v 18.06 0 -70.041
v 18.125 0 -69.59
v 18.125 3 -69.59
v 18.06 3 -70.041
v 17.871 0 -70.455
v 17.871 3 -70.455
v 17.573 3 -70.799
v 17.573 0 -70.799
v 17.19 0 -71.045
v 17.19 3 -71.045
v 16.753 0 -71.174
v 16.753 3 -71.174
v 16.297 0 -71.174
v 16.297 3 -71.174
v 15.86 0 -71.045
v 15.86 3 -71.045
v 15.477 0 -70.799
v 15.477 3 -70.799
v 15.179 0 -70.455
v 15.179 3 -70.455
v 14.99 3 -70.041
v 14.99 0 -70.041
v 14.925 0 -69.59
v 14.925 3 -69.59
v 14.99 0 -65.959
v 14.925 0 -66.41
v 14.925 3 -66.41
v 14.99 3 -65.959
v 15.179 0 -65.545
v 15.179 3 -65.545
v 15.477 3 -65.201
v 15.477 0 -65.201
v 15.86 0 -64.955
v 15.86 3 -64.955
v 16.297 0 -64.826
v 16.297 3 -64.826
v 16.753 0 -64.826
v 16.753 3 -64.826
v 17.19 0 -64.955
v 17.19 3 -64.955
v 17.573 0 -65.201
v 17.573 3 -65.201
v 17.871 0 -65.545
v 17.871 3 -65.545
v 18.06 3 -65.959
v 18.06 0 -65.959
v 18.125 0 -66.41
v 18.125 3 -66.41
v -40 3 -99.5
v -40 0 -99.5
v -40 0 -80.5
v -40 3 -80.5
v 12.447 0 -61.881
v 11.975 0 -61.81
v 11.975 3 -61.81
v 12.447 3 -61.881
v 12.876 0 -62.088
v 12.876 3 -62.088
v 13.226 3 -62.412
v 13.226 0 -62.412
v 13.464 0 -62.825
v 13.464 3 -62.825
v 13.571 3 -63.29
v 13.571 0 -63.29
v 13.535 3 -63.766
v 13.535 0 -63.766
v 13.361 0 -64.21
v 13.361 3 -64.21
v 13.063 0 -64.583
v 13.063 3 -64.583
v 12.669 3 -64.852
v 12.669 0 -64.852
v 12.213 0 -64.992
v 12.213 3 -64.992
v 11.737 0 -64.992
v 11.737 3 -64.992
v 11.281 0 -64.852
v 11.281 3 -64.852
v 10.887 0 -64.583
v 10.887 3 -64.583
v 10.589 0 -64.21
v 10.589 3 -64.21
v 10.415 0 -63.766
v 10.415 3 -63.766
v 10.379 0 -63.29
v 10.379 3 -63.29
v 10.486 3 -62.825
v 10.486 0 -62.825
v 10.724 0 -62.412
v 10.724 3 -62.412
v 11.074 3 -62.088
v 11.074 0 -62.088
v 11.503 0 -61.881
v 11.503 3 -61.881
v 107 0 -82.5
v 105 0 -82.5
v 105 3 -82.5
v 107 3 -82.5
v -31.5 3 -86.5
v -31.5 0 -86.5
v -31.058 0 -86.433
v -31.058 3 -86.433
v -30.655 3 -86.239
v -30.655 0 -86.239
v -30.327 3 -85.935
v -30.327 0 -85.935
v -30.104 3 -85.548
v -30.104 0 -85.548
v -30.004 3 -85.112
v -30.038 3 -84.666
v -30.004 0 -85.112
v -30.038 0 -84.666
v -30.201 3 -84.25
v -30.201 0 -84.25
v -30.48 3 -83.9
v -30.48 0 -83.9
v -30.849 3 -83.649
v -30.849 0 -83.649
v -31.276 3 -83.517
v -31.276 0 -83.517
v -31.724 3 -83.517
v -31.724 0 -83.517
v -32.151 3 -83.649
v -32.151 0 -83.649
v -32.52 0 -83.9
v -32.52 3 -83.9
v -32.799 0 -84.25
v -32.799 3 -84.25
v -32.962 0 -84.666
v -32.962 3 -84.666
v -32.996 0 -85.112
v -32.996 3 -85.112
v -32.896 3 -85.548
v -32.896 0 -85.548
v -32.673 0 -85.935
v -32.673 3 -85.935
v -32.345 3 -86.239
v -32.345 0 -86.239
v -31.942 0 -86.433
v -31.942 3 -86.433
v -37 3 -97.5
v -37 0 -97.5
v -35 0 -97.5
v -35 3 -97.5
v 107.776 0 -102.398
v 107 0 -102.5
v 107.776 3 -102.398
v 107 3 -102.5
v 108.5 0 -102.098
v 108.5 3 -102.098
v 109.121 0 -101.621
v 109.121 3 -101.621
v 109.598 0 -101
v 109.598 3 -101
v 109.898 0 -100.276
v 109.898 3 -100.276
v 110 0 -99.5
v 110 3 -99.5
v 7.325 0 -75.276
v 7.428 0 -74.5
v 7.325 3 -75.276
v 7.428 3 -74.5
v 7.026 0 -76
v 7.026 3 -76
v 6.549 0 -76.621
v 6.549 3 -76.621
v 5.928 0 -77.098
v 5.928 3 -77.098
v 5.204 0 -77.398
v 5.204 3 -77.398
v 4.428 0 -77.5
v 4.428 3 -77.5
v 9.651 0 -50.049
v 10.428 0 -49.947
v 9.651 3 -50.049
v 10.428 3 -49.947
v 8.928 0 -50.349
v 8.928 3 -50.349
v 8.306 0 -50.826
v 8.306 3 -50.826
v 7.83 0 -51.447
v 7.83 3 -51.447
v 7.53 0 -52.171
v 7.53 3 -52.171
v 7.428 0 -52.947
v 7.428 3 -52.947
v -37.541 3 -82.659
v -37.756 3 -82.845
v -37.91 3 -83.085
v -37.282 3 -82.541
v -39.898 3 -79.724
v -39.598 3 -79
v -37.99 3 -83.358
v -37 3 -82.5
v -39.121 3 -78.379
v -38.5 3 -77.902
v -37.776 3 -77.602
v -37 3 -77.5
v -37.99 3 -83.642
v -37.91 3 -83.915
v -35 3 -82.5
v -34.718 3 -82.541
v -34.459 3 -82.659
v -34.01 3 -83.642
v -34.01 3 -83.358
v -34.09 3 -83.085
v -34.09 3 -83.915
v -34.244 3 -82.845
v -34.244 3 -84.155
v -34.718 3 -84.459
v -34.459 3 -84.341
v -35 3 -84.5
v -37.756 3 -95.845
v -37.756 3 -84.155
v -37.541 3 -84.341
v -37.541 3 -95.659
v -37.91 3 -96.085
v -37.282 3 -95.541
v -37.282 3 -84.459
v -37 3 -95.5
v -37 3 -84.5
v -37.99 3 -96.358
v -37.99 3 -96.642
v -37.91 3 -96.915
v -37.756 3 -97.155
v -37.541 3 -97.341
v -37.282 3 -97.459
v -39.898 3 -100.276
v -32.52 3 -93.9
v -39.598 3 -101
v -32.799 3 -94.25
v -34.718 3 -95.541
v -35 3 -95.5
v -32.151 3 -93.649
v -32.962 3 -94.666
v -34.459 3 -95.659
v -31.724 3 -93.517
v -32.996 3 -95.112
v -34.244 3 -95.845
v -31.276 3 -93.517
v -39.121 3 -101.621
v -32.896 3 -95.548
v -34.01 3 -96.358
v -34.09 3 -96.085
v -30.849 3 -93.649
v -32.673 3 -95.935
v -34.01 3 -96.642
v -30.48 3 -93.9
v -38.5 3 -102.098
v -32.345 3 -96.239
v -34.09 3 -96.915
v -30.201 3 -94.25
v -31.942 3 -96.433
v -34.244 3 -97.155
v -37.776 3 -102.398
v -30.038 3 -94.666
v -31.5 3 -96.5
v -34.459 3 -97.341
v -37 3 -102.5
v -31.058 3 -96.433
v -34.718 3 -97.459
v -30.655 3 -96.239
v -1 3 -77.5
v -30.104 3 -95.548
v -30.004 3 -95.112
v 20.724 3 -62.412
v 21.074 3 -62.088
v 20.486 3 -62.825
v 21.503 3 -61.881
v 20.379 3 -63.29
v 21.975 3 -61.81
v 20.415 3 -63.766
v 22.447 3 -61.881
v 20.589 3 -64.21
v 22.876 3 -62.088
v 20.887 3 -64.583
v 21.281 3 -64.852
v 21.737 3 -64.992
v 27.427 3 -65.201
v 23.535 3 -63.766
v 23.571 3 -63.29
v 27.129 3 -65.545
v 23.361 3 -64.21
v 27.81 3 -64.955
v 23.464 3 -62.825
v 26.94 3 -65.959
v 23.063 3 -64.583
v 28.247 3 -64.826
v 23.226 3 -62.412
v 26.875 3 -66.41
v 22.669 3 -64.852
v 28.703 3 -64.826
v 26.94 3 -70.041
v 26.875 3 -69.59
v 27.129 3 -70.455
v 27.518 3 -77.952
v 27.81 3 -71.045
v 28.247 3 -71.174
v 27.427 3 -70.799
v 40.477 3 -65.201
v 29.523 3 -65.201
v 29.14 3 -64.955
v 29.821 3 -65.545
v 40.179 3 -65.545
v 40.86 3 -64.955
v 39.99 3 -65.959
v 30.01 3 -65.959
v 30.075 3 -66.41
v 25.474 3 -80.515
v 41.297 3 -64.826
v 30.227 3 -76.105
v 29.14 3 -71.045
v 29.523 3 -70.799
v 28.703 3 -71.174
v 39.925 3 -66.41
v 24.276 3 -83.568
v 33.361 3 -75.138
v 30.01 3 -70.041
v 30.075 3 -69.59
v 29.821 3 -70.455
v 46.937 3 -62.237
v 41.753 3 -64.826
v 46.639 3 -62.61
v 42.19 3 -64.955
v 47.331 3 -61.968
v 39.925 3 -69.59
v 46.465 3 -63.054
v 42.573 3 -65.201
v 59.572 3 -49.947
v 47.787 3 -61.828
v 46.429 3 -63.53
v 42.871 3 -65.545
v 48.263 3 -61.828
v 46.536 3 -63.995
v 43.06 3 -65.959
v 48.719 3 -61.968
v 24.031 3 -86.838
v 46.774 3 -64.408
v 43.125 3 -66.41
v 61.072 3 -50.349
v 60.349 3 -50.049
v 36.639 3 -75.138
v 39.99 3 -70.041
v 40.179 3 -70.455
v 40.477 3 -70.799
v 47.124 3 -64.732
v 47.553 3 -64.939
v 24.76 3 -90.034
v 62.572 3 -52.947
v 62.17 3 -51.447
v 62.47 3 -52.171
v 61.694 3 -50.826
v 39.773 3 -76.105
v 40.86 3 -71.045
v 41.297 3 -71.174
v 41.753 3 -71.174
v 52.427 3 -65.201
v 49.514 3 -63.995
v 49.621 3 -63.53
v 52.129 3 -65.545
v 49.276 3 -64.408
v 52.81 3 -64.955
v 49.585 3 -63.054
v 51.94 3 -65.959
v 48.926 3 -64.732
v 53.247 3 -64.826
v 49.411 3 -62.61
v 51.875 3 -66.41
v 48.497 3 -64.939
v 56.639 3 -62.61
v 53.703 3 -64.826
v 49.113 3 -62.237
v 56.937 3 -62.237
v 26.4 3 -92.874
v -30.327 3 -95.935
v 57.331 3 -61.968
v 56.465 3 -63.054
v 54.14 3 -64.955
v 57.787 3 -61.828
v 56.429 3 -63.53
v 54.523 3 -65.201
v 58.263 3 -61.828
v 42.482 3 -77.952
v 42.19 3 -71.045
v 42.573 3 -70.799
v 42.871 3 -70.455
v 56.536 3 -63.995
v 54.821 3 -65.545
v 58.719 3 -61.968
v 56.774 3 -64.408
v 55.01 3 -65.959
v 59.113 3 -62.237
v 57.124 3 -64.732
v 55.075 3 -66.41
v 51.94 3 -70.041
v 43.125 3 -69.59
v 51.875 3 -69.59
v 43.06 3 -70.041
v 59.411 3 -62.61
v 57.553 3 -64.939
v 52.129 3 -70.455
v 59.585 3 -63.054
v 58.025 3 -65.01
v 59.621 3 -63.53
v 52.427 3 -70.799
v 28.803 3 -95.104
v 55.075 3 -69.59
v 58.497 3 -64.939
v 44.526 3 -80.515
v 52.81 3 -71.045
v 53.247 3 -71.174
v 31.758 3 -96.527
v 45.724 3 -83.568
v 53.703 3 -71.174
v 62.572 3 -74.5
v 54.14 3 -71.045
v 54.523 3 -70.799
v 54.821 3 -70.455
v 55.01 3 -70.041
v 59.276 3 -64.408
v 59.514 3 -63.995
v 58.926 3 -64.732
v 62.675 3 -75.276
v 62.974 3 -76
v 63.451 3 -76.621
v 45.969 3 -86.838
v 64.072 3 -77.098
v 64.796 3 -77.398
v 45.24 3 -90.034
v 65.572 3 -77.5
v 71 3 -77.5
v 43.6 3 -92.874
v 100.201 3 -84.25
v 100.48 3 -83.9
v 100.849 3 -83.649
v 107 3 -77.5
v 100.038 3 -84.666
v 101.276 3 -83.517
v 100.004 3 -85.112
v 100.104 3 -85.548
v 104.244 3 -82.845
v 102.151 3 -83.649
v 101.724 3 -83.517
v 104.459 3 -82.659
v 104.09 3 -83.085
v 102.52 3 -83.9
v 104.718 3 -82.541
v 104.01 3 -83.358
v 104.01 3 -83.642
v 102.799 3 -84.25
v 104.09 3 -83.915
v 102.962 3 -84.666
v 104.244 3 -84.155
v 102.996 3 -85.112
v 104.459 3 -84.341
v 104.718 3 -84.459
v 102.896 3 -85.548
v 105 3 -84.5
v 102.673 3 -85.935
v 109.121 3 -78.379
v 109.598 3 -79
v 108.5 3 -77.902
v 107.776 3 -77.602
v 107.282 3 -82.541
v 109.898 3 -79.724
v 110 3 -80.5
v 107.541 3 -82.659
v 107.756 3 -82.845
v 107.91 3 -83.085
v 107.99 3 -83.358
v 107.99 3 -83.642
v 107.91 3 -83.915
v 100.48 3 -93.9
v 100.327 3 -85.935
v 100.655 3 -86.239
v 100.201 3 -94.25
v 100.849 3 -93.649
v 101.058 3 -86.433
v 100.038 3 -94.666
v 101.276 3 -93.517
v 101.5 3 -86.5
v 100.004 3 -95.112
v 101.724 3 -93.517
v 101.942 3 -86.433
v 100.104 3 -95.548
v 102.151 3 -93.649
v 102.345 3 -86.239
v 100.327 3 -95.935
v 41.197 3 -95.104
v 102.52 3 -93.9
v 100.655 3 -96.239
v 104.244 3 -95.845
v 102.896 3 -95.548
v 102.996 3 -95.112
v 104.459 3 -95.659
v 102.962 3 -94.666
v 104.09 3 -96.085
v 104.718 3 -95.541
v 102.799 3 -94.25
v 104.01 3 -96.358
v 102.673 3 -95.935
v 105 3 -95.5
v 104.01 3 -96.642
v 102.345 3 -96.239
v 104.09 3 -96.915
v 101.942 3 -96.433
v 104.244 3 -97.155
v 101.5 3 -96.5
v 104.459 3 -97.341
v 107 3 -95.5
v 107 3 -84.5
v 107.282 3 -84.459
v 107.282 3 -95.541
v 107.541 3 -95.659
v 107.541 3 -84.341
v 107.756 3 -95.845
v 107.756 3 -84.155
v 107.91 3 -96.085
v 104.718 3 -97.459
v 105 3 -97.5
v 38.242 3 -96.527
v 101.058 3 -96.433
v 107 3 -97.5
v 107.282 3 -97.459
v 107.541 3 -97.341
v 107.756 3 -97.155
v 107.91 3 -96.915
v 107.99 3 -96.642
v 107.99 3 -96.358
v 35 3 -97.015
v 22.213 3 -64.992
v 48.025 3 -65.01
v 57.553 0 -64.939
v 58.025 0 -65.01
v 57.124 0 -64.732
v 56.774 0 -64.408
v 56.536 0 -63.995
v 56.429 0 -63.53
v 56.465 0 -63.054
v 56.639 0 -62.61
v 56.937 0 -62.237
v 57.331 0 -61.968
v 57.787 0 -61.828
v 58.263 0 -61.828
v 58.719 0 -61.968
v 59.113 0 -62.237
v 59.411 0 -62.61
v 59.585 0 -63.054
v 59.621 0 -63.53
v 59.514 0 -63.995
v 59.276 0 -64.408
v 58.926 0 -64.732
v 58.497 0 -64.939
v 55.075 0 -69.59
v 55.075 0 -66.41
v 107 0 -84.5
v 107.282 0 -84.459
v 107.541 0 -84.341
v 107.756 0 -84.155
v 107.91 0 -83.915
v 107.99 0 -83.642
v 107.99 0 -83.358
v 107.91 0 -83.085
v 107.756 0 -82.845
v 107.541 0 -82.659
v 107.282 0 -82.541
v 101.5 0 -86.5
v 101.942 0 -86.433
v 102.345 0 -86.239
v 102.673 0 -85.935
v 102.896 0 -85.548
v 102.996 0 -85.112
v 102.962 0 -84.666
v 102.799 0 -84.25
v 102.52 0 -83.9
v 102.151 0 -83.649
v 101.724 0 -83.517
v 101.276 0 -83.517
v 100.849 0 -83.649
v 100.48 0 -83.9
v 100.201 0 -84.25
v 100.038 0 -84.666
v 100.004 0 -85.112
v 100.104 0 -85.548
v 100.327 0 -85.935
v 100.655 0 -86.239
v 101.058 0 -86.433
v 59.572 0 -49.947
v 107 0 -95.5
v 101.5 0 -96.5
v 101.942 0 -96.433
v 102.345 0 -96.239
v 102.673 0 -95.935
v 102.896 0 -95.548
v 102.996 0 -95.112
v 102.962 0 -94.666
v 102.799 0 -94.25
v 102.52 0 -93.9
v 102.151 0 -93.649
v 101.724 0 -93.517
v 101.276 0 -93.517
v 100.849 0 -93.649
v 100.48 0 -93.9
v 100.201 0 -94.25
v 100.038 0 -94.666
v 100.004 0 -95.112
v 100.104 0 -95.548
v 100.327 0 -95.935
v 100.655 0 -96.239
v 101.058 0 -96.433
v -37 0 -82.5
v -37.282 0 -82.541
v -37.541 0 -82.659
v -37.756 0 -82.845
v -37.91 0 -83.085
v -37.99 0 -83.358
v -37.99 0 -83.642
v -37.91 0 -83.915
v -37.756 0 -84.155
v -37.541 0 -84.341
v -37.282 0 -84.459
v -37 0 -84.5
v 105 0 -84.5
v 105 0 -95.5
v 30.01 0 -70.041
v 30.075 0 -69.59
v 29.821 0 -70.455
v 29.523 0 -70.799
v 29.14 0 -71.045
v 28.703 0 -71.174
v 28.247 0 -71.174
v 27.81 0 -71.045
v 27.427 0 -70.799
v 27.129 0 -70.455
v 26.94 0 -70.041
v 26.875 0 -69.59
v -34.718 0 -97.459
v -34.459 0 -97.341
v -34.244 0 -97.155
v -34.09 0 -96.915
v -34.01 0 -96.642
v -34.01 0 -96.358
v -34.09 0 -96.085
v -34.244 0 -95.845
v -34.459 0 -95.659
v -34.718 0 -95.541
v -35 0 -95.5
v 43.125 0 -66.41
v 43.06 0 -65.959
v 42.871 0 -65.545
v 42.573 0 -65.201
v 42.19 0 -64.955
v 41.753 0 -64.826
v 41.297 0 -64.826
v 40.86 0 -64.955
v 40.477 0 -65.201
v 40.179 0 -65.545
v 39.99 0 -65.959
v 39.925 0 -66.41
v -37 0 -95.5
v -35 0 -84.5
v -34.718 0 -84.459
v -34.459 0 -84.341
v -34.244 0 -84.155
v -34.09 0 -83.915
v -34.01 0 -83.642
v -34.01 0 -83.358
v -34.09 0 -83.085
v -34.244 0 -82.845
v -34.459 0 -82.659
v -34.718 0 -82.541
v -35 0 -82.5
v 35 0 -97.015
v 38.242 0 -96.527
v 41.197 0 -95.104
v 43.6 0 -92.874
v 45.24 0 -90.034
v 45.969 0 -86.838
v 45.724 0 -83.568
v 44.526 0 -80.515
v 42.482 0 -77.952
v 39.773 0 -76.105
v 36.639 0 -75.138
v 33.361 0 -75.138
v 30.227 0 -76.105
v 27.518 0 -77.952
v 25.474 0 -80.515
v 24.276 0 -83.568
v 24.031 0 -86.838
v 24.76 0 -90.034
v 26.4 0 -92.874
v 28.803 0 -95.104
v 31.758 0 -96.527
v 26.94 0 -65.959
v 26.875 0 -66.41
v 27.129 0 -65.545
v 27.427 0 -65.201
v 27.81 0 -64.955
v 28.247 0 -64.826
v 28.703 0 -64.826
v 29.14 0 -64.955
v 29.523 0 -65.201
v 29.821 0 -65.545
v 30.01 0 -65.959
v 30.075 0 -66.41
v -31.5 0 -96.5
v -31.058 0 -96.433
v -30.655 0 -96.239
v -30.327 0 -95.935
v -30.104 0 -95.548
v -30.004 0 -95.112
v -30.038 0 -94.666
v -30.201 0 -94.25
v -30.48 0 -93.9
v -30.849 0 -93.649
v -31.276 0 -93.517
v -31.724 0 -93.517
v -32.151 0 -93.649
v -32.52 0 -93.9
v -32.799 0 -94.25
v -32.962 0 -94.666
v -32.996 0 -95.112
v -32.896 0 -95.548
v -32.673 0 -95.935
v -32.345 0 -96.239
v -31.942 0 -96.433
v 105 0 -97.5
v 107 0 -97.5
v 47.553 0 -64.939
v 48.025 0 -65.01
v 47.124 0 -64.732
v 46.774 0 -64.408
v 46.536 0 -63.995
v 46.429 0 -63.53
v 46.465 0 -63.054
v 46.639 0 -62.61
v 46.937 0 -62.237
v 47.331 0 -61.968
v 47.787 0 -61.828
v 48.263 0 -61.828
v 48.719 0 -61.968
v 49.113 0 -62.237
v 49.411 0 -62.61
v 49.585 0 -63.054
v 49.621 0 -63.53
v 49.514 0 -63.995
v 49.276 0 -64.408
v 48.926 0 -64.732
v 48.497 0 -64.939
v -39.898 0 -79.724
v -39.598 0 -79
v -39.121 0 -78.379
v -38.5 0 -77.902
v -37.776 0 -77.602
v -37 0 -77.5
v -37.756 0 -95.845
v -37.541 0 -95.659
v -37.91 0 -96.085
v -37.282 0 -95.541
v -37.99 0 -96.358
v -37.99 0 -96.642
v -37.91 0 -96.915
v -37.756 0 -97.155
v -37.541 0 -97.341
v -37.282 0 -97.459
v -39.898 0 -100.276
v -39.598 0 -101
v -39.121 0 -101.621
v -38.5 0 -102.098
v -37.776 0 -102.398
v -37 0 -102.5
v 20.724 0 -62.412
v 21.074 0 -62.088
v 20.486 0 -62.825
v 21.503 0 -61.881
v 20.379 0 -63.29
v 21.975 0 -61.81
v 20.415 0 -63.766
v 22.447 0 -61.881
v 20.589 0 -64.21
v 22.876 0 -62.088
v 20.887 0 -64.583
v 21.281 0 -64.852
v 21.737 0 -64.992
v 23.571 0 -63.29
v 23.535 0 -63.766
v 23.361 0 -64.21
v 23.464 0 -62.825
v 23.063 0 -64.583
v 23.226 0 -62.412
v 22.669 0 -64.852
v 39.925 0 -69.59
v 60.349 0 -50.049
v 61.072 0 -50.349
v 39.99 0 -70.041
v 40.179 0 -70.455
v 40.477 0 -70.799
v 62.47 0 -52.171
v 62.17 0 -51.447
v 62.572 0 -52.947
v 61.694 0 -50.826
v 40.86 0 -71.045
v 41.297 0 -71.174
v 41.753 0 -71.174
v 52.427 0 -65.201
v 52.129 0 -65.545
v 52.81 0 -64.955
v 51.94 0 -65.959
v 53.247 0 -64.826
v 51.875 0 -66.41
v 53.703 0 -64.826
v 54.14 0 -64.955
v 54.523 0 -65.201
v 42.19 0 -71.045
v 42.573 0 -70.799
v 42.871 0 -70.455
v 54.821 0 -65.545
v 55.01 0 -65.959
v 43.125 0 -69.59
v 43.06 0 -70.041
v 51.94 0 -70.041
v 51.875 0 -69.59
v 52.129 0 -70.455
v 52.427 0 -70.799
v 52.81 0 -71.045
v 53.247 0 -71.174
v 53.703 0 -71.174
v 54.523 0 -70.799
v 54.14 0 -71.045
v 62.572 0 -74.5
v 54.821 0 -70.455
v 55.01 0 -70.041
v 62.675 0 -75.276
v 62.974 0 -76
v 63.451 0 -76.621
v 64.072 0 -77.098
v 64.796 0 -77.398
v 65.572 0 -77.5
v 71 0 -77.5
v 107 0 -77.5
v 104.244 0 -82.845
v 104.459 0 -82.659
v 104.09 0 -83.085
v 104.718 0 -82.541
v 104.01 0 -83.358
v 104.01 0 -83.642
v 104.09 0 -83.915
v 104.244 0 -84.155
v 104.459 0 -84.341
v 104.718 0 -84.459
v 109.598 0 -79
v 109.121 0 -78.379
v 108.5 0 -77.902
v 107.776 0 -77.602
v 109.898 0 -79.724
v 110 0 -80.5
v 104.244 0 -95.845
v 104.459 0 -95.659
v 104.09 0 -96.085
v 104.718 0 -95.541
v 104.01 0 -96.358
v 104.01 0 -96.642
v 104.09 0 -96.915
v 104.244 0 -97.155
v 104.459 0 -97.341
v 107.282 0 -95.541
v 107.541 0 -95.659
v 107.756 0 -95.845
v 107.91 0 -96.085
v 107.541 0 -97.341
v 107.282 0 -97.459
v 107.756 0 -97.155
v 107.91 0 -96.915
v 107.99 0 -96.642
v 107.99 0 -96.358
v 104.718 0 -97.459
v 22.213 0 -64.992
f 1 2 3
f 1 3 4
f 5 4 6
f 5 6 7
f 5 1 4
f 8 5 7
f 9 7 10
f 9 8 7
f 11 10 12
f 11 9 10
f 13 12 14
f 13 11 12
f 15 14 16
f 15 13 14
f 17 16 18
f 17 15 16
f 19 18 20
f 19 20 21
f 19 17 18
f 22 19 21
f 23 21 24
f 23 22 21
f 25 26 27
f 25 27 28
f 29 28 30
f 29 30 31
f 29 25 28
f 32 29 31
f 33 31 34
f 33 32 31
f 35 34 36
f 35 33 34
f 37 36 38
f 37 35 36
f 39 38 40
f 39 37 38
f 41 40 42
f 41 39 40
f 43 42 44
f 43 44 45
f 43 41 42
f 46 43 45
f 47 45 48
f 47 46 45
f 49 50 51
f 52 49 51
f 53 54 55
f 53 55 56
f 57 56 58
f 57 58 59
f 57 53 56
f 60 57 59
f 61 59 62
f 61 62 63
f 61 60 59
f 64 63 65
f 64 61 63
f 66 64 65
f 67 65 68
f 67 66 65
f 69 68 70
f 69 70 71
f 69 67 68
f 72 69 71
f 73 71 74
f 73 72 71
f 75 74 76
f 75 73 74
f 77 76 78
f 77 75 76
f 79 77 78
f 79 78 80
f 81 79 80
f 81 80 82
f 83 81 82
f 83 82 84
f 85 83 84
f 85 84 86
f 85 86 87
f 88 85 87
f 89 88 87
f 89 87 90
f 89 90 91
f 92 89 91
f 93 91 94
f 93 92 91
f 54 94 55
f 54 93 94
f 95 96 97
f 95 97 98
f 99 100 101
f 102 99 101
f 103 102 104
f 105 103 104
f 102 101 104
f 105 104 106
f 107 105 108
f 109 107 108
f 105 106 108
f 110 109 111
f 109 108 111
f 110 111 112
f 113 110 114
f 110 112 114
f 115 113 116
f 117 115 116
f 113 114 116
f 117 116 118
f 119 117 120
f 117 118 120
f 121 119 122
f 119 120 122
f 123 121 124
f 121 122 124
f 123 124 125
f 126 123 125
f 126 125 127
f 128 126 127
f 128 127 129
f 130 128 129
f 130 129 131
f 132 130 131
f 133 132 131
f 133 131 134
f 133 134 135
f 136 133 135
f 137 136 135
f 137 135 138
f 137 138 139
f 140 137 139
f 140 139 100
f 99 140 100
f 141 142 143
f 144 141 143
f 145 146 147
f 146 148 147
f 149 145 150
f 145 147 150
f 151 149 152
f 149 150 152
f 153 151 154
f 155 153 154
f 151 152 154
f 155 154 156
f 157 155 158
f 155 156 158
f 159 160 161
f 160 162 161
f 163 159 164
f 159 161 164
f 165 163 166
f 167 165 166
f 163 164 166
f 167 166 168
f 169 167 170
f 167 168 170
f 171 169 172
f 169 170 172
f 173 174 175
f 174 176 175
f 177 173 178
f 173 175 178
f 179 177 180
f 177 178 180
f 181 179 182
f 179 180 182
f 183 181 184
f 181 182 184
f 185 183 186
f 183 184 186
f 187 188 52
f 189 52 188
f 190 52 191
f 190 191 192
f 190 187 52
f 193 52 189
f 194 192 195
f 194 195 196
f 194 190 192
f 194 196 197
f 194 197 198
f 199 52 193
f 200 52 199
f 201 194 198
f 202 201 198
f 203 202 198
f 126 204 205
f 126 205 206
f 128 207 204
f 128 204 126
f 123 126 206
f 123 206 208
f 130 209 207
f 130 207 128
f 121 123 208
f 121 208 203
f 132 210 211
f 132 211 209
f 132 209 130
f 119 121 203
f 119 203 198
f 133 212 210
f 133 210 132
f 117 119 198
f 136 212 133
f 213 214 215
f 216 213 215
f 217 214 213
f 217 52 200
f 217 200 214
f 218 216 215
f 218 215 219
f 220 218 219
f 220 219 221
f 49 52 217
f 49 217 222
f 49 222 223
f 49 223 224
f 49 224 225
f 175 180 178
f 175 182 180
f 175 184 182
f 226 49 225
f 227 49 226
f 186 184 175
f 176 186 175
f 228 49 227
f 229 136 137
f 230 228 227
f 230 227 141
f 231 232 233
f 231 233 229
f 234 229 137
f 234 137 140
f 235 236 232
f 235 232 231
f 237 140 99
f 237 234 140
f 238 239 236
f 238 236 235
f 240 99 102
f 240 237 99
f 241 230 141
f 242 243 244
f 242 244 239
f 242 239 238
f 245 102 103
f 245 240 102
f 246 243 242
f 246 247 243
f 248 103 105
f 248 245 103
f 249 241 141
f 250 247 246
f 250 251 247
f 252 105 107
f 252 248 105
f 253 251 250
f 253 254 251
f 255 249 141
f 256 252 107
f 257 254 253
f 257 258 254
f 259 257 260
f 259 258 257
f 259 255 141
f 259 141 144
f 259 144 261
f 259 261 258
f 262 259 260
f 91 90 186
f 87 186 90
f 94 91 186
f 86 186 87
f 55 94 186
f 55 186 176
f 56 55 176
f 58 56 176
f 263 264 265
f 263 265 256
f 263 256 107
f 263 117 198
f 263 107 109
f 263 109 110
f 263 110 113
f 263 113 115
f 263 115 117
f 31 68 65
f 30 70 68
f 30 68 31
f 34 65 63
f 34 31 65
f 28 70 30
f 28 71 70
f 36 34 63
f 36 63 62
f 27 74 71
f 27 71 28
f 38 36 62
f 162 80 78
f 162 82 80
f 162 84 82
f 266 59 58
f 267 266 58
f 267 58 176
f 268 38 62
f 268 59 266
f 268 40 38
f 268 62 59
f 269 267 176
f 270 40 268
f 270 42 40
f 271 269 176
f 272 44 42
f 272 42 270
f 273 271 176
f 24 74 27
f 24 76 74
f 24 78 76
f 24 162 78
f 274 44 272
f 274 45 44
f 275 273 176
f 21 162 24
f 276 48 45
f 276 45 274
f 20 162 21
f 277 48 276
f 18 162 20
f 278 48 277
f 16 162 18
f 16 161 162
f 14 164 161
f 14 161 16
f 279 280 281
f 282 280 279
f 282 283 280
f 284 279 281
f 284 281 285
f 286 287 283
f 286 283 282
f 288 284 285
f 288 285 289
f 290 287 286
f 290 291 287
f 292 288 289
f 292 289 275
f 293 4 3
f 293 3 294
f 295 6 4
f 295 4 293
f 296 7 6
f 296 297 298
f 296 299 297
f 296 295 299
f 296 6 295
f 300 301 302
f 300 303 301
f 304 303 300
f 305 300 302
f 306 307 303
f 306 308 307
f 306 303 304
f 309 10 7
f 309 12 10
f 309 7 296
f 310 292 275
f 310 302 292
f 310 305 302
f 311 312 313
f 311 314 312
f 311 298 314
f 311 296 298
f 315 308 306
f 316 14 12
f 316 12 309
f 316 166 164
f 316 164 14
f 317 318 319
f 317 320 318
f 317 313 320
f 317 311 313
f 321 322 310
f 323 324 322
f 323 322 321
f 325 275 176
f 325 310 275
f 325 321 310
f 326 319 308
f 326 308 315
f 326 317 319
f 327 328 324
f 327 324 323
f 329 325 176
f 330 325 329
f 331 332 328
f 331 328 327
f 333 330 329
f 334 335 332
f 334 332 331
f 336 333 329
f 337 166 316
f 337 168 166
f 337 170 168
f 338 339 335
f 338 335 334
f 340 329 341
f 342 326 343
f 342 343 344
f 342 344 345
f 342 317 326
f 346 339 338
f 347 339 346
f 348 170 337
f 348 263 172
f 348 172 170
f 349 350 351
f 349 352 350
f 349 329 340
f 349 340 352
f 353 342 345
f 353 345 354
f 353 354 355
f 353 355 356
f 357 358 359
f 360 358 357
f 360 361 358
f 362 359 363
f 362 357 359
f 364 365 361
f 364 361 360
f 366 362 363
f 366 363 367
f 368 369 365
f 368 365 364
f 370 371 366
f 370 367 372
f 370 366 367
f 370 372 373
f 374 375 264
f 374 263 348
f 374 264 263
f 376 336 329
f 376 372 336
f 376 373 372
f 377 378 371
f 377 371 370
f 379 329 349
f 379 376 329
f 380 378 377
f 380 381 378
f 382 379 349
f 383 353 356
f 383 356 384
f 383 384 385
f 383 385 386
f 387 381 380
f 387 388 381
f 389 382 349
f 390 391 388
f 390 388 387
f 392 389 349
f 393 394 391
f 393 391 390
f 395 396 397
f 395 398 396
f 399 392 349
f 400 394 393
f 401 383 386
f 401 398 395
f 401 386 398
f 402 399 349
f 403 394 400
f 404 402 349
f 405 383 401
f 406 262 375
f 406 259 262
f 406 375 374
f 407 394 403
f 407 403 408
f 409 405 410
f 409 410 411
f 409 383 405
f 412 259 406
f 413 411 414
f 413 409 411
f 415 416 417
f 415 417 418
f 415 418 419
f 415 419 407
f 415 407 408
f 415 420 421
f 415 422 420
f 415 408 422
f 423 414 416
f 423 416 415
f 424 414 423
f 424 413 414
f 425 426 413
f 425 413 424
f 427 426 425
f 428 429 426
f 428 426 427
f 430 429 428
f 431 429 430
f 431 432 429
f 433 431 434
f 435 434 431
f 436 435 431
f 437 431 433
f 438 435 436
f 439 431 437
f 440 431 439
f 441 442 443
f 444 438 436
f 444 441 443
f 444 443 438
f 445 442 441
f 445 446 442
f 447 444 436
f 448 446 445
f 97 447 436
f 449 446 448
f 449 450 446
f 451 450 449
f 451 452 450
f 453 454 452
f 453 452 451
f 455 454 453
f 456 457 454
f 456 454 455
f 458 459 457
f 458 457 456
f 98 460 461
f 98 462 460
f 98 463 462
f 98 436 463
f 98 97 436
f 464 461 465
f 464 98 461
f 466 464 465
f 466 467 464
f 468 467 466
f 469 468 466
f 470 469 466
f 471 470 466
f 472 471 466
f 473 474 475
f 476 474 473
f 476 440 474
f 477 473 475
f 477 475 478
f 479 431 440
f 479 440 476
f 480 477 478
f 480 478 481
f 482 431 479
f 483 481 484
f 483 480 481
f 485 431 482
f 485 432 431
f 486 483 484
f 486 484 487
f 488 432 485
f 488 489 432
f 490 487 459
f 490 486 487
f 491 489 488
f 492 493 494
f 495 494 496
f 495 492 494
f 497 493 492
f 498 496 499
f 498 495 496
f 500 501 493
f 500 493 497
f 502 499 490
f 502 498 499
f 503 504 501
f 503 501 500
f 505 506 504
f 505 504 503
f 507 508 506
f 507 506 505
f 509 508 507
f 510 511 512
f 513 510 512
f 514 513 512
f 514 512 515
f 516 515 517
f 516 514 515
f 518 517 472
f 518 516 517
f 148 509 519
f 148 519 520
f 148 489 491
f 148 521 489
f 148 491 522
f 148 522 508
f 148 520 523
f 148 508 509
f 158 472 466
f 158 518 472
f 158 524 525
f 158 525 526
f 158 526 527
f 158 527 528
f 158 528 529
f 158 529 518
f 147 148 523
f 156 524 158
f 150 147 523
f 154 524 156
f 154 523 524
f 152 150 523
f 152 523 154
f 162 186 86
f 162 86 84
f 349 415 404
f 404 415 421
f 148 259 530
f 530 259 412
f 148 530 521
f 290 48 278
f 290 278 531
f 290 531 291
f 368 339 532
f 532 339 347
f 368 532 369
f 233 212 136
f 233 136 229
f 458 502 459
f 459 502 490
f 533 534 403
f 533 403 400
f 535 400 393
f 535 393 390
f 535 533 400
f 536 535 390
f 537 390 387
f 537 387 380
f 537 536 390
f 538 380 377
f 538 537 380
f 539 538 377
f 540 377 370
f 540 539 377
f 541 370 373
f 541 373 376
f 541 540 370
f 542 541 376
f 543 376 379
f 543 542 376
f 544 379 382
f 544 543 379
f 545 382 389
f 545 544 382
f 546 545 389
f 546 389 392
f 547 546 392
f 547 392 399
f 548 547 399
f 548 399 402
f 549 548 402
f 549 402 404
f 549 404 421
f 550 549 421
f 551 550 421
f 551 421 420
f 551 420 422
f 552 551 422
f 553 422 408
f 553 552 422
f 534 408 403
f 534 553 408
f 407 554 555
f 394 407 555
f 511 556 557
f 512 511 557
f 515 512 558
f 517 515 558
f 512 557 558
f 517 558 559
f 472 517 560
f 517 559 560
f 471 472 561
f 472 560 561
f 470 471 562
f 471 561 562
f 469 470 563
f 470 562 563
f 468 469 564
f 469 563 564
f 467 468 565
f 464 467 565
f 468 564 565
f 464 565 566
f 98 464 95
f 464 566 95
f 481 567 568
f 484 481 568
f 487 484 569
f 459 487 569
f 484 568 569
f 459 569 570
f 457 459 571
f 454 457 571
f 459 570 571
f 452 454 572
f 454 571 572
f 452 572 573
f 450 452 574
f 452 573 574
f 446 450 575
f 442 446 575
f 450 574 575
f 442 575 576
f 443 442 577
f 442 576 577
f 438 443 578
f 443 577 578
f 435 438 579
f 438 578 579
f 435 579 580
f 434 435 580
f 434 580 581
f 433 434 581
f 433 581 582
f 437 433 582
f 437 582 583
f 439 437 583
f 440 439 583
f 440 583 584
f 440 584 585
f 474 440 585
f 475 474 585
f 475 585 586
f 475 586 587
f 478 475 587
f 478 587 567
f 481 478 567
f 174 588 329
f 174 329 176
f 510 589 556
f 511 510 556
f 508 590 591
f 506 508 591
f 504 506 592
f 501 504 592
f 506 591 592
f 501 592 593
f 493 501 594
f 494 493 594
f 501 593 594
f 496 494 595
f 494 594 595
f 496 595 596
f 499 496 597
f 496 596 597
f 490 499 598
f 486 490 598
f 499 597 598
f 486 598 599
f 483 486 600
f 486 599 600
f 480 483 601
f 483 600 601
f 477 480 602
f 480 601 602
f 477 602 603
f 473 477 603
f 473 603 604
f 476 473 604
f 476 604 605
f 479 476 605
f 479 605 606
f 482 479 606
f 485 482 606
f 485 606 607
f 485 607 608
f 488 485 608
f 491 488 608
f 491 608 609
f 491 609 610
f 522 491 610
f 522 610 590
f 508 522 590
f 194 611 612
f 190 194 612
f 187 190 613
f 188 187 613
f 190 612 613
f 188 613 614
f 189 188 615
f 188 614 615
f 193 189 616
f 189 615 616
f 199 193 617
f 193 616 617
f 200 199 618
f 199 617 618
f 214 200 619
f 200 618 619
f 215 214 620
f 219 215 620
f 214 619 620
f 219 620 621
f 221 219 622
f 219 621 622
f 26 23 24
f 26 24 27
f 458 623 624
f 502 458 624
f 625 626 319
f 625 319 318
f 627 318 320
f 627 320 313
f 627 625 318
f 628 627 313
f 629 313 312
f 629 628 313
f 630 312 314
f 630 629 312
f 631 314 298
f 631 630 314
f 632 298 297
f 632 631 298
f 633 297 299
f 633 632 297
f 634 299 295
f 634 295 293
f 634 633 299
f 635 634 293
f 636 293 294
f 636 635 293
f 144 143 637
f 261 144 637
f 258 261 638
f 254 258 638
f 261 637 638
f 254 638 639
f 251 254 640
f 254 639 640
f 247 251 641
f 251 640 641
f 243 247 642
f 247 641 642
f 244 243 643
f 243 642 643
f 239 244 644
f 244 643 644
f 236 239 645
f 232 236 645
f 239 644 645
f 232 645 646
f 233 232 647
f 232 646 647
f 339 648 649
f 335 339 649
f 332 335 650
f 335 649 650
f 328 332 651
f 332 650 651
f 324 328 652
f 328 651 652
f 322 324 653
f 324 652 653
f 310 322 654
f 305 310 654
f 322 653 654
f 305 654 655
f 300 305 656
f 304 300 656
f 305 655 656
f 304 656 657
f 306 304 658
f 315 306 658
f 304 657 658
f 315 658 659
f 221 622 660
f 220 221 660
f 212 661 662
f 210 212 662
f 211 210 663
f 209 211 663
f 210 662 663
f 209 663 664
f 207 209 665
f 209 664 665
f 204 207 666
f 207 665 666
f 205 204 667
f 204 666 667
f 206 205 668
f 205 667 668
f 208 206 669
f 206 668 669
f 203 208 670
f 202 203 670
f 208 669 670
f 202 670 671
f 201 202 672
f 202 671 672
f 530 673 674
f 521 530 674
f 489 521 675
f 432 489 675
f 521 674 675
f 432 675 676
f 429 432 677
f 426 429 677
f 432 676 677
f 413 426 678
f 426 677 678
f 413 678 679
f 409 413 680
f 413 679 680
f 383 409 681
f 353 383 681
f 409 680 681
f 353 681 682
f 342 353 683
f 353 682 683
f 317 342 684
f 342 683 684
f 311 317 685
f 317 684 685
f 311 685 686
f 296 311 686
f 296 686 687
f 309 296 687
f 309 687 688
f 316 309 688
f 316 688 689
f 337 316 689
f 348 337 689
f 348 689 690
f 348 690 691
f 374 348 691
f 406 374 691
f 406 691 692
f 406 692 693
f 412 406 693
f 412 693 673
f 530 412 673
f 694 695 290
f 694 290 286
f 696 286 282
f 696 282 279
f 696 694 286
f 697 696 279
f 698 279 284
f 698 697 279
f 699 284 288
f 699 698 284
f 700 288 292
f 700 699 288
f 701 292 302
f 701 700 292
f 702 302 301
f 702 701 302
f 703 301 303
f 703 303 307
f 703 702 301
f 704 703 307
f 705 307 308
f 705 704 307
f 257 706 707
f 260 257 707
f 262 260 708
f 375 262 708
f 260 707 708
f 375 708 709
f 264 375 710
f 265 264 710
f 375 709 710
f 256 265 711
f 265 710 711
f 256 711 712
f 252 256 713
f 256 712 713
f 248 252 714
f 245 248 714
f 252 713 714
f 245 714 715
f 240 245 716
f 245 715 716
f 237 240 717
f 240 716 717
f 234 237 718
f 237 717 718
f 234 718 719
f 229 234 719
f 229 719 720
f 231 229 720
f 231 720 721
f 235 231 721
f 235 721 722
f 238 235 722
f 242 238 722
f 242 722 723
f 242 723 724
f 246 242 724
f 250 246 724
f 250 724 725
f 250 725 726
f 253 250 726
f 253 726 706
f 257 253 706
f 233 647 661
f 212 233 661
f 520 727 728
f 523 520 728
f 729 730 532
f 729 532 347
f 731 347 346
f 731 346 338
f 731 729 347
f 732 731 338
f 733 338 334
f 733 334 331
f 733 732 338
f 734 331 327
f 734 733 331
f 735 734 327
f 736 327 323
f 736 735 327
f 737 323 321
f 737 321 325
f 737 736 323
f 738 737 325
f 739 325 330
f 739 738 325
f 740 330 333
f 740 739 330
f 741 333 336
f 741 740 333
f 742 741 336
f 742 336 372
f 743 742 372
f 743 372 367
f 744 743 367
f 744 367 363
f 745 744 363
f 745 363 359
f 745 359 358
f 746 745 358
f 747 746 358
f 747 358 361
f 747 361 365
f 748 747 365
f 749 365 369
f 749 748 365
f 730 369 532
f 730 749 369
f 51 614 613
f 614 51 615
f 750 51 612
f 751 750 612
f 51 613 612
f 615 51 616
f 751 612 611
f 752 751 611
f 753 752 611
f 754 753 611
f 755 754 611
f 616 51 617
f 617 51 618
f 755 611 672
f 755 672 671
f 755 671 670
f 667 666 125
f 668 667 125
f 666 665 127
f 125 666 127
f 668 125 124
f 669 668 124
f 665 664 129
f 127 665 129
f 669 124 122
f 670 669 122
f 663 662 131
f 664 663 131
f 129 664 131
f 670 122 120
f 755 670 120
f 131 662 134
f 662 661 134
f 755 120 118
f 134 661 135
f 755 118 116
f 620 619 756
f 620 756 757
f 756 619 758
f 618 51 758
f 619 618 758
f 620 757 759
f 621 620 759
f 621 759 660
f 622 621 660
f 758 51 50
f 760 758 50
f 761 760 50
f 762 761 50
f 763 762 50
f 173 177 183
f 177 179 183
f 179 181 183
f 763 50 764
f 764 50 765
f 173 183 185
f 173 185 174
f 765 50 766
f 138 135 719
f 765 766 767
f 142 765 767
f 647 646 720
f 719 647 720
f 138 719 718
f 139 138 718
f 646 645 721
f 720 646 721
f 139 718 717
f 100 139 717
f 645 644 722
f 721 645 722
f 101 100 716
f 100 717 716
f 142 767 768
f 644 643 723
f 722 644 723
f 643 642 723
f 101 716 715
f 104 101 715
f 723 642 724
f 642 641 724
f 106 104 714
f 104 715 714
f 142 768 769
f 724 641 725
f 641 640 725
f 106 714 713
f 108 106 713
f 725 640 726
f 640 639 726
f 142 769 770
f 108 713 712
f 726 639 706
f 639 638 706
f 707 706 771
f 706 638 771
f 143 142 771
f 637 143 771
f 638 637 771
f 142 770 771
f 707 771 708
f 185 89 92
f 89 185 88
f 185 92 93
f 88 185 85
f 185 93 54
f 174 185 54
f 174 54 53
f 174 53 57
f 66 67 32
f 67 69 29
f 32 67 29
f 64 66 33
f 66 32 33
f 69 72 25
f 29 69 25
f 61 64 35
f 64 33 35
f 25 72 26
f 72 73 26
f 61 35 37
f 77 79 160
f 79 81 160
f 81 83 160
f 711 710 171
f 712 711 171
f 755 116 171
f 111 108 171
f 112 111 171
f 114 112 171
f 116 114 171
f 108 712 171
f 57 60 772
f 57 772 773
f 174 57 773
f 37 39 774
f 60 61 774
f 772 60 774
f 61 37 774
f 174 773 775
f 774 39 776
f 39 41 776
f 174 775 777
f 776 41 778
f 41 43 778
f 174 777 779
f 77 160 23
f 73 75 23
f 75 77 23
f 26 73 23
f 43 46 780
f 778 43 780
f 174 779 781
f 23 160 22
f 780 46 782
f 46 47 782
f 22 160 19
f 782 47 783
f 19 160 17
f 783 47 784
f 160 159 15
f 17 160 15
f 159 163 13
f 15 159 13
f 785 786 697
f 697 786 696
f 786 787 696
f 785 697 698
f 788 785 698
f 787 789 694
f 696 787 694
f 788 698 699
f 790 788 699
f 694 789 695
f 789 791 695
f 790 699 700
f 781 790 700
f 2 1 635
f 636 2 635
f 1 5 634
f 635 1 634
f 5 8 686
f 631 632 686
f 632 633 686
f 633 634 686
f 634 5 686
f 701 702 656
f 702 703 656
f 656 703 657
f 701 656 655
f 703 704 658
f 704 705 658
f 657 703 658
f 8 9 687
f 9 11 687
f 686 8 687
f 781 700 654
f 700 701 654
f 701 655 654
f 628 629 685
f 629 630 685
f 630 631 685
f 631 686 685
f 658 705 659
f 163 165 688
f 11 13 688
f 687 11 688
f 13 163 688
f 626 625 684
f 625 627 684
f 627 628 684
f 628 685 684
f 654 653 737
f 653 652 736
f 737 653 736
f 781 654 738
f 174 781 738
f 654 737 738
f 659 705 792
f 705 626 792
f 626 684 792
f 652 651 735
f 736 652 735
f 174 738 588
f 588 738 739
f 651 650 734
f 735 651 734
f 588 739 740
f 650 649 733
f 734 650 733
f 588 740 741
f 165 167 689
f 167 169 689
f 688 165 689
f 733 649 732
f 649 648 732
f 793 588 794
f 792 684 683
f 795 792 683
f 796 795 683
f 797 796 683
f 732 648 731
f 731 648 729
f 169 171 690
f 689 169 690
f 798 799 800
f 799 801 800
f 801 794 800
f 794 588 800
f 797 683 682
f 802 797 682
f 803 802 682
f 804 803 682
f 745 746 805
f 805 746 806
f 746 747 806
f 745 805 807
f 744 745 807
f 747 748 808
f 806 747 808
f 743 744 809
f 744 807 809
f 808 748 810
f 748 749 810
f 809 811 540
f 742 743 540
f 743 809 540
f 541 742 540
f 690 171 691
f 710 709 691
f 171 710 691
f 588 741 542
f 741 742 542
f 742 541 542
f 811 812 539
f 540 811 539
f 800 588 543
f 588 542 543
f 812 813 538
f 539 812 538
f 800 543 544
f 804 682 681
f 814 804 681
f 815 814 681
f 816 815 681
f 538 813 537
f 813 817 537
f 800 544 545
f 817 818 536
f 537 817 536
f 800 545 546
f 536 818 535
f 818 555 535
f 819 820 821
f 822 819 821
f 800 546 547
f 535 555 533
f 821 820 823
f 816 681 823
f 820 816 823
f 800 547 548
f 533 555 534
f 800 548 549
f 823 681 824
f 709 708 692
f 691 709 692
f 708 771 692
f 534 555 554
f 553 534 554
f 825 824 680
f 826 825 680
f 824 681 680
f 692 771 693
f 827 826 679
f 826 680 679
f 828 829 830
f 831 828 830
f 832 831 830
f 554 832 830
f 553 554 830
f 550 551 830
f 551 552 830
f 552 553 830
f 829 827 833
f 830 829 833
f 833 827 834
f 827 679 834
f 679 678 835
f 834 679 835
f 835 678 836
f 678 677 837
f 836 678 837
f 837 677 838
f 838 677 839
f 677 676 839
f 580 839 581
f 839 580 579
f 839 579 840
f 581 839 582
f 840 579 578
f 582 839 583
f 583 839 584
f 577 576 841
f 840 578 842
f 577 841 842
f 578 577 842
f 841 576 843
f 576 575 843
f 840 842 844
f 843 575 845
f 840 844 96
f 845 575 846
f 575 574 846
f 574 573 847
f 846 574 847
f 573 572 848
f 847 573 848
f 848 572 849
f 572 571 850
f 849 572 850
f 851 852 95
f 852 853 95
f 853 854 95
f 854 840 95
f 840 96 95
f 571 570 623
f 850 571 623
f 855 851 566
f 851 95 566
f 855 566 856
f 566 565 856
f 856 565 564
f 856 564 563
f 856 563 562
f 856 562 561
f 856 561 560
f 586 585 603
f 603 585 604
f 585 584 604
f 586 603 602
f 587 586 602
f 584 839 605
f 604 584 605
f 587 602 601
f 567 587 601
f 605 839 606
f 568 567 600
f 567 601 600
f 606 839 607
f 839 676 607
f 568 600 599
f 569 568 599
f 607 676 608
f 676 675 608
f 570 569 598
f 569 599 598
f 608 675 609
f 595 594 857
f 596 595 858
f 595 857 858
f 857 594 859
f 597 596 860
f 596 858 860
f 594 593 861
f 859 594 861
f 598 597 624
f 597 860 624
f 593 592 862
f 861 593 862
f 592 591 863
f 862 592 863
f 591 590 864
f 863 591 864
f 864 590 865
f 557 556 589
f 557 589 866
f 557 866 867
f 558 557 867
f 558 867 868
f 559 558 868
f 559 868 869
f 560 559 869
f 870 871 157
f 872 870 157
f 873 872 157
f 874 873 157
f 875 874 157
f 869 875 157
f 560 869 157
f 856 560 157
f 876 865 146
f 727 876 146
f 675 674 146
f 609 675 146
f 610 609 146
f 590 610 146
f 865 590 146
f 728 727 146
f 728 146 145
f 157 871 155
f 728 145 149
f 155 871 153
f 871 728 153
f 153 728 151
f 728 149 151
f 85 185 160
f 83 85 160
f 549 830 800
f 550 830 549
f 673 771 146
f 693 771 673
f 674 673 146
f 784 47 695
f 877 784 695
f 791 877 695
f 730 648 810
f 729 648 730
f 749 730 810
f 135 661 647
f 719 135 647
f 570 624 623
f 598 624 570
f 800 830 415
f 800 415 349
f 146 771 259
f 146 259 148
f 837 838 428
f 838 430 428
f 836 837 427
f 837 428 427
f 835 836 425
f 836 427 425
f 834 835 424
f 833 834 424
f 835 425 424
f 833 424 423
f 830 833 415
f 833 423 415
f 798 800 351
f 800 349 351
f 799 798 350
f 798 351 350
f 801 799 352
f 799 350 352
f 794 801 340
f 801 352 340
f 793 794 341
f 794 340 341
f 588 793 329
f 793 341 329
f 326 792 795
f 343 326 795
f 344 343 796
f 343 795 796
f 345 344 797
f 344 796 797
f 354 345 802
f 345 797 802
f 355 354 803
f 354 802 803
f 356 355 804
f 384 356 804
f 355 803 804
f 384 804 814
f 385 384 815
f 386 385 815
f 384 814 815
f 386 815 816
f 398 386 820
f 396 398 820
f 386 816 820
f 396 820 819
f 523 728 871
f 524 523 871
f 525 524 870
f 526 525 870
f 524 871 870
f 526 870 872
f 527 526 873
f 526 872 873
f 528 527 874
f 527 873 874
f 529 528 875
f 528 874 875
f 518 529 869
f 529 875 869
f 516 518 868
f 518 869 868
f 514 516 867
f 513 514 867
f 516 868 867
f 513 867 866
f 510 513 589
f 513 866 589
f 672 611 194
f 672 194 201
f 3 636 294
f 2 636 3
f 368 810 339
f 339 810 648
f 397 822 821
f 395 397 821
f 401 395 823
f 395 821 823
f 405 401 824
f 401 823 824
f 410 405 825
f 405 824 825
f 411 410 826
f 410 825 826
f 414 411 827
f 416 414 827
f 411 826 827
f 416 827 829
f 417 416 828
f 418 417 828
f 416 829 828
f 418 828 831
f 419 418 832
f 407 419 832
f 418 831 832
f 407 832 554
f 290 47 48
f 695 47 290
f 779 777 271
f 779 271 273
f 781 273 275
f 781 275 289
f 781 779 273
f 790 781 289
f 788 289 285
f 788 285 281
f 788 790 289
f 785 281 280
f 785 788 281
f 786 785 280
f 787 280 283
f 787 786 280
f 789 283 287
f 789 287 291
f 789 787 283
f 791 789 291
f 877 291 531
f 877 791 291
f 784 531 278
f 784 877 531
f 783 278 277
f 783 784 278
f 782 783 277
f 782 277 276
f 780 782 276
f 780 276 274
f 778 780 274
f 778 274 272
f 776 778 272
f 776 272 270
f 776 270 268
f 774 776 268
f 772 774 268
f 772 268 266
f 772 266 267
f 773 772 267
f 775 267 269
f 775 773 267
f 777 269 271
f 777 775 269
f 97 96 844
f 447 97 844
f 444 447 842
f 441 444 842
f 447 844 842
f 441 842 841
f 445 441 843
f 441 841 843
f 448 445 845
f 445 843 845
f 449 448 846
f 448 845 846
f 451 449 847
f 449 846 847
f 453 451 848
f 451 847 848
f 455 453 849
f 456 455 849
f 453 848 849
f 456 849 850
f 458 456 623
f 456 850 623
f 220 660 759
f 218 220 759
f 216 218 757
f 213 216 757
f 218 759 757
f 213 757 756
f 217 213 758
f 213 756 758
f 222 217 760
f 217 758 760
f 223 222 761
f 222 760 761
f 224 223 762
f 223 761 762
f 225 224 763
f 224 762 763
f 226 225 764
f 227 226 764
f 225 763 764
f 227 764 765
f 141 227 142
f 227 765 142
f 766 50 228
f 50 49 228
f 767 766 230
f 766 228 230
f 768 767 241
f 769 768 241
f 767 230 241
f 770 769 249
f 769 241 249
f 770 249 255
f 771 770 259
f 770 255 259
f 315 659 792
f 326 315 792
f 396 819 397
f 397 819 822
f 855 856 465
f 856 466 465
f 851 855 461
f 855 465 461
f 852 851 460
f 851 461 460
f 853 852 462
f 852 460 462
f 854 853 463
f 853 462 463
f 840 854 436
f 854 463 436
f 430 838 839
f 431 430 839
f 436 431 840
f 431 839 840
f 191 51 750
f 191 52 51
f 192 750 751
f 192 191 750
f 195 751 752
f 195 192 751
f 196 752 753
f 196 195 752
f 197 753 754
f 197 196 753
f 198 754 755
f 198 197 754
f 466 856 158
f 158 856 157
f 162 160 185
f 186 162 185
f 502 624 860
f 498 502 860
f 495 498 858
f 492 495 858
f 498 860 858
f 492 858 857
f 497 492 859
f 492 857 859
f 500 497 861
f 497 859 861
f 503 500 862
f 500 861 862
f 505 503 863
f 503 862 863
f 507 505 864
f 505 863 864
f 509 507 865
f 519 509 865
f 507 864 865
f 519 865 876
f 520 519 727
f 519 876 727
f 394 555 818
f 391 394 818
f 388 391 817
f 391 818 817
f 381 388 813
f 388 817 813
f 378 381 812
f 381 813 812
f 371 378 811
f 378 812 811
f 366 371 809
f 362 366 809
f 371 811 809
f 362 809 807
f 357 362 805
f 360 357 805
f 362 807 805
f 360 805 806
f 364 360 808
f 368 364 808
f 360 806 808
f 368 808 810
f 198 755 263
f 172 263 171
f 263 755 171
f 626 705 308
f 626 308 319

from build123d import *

# Parameters (mm, degrees)
SKETCH_1_R          = 1.6
EXTRUDE_1_DEPTH     = 3
SKETCH_5_W          = 8.427610272
SKETCH_5_H          = 29.562823711
CUT_EXTRUDE_4_DEPTH = 10
SKETCH_7_W          = 55.144779456
SKETCH_7_H          = 10
CUT_EXTRUDE_1_DEPTH = 100
CUT_EXTRUDE_5_DEPTH = 100
CUT_EXTRUDE_6_DEPTH = 100
FILLET_3_R          = 3
SKETCH_10_W         = 2
SKETCH_10_H         = 2
SKETCH_10_H_2       = 11
SKETCH_10_R         = 1.5
CUT_EXTRUDE_7_DEPTH = 10
SKETCH_11_R         = 11
CUT_EXTRUDE_8_DEPTH = 10


with BuildPart() as part:
    # 草图1 → 凸台-拉伸1 (new body)
    with BuildSketch(Plane(origin=(0, 0, 0), x_dir=(1, 0, 0), z_dir=(0, 1, 0))):
        Polygon((-1, -77.5), (-40, -77.5), (-40, -235.15), (110, -235.15), (110, -77.5), (71, -77.5), (71, -47.937176289), (113.89906921, -47.937176289), (113.89906921, 47.937176289), (71, 47.937176289), (71, 77.5), (110, 77.5), (110, 235.15), (-40, 235.15), (-40, 77.5), (-1, 77.5), (-1, 47.937176289), (-43.89906921, 47.937176289), (-43.89906921, -47.937176289), (-1, -47.937176289), align=None)
        with Locations(Location((48.025, -63.59, 0), (0, 0, 90))):
            Circle(SKETCH_1_R, mode=Mode.SUBTRACT)
        with Locations(Location((58.025, -63.59, 0), (0, 0, 90))):
            Circle(SKETCH_1_R, mode=Mode.SUBTRACT)
        with Locations(Location((58.025, 63.41, 0), (0, 0, 90))):
            Circle(SKETCH_1_R, mode=Mode.SUBTRACT)
        with Locations(Location((48.025, 63.41, 0), (0, 0, 90))):
            Circle(SKETCH_1_R, mode=Mode.SUBTRACT)
        with Locations(Location((11.975, -63.59, 0), (0, 0, 270))):
            Circle(SKETCH_1_R, mode=Mode.SUBTRACT)
        with Locations(Location((21.975, -63.59, 0), (0, 0, 270))):
            Circle(SKETCH_1_R, mode=Mode.SUBTRACT)
        with Locations(Location((21.975, 63.41, 0), (0, 0, 270))):
            Circle(SKETCH_1_R, mode=Mode.SUBTRACT)
        with Locations(Location((11.975, 63.41, 0), (0, 0, 270))):
            Circle(SKETCH_1_R, mode=Mode.SUBTRACT)
        with BuildLine():
            Line((30.075, -69.59), (30.075, -66.41))
            ThreePointArc((30.075, -66.41), (28.475, -64.81), (26.875, -66.41))
            Line((26.875, -66.41), (18.125, -66.41))
            ThreePointArc((18.125, -66.41), (16.525, -64.81), (14.925, -66.41))
            Line((14.925, -66.41), (14.925, -69.59))
            ThreePointArc((14.925, -69.59), (16.525, -71.19), (18.125, -69.59))
            Line((18.125, -69.59), (26.875, -69.59))
            ThreePointArc((26.875, -69.59), (28.475, -71.19), (30.075, -69.59))
        make_face(mode=Mode.SUBTRACT)
        with BuildLine():
            Line((43.125, 69.59), (51.875, 69.59))
            ThreePointArc((51.875, 69.59), (53.475, 71.19), (55.075, 69.59))
            Line((55.075, 69.59), (55.075, 66.41))
            ThreePointArc((55.075, 66.41), (53.475, 64.81), (51.875, 66.41))
            Line((51.875, 66.41), (43.125, 66.41))
            ThreePointArc((43.125, 66.41), (41.525, 64.81), (39.925, 66.41))
            Line((39.925, 66.41), (39.925, 69.59))
            ThreePointArc((39.925, 69.59), (41.525, 71.19), (43.125, 69.59))
        make_face(mode=Mode.SUBTRACT)
        with BuildLine():
            Line((55.075, -69.59), (55.075, -66.41))
            ThreePointArc((55.075, -66.41), (53.475, -64.81), (51.875, -66.41))
            Line((51.875, -66.41), (43.125, -66.41))
            ThreePointArc((43.125, -66.41), (41.525, -64.81), (39.925, -66.41))
            Line((39.925, -66.41), (39.925, -69.59))
            ThreePointArc((39.925, -69.59), (41.525, -71.19), (43.125, -69.59))
            Line((43.125, -69.59), (51.875, -69.59))
            ThreePointArc((51.875, -69.59), (53.475, -71.19), (55.075, -69.59))
        make_face(mode=Mode.SUBTRACT)
        with BuildLine():
            Line((14.925, 69.59), (14.925, 66.41))
            ThreePointArc((14.925, 66.41), (16.525, 64.81), (18.125, 66.41))
            Line((18.125, 66.41), (26.875, 66.41))
            ThreePointArc((26.875, 66.41), (28.475, 64.81), (30.075, 66.41))
            Line((30.075, 66.41), (30.075, 69.59))
            ThreePointArc((30.075, 69.59), (28.475, 71.19), (26.875, 69.59))
            Line((26.875, 69.59), (18.125, 69.59))
            ThreePointArc((18.125, 69.59), (16.525, 71.19), (14.925, 69.59))
        make_face(mode=Mode.SUBTRACT)
    extrude(amount=EXTRUDE_1_DEPTH)

    # 草图5 → 切除-拉伸4 (cut)
    with BuildSketch(Plane.XZ):
        with Locations((66.786194864, 62.718588145)):
            Rectangle(SKETCH_5_W, SKETCH_5_H)
        with Locations((3.213805136, 62.718588145)):
            Rectangle(SKETCH_5_W, SKETCH_5_H)
        with Locations((3.213805136, -62.718588145)):
            Rectangle(SKETCH_5_W, SKETCH_5_H)
        with Locations((66.786194864, -62.718588145)):
            Rectangle(SKETCH_5_W, SKETCH_5_H)
    extrude(amount=-CUT_EXTRUDE_4_DEPTH, mode=Mode.SUBTRACT)

    # 草图7 → 切除-拉伸-薄壁1 (cut)
    with BuildSketch(Plane(origin=(0, 0, 0), x_dir=(-1, 0, 0), z_dir=(0, -1, 0))):
        with Locations((-35, -55.277176289)):
            Rectangle(SKETCH_7_W, SKETCH_7_H)
        Polygon((-113.89906921, -0.33), (-113.89906921, 47.607176289), (-62.572389728, 47.607176289), (-62.572389728, 49.947176289), (-7.427610272, 49.947176289), (-7.427610272, 47.607176289), (43.89906921, 47.607176289), (43.89906921, -0.33), (33.89906921, -0.33), (33.89906921, 37.607176289), (-17.427610272, 37.607176289), (-17.427610272, 39.947176289), (-52.572389728, 39.947176289), (-52.572389728, 37.607176289), (-103.89906921, 37.607176289), (-103.89906921, -0.33), align=None)
    extrude(amount=-CUT_EXTRUDE_1_DEPTH, mode=Mode.SUBTRACT)


with BuildPart() as cut_extrude_1_piece_1:
    # of the separate pieces the step leaves, piece 1, a body of its own (cut_extrude_1_pieces)
    add(part.part.solids().sort_by_distance((7.427610272, 0, -77.5))[0])

    # 草图9 → 切除-拉伸6 (cut)
    with BuildSketch(Plane.XZ):
        Polygon((-40, -102.5), (110, -102.5), (124.211694431, -119.691261336), (154.987235789, -211.57345947), (124.211694431, -286.861832075), (-63.673505757, -270.701496299), (-75.556105593, -182.770257517), (-74.082044988, -165.632360403), align=None)
    extrude(amount=-CUT_EXTRUDE_6_DEPTH, mode=Mode.SUBTRACT)

    # 圆角3
    fillet_3_edges = [cut_extrude_1_piece_1.edges().sort_by_distance(p)[0] for p in [
        (110, 1.5, -77.5),
        (-40, 1.5, -77.5),
        (62.572389728, 1.5, -77.5),
        (7.427610272, 1.5, -77.5),
        (-40, 1.5, -102.5),
        (110, 1.5, -102.5),
        (7.427610272, 1.5, -49.947176289),
        (62.572389728, 1.5, -49.947176289),
    ]]
    fillet(fillet_3_edges, radius=FILLET_3_R)

    # 草图10 → 切除-拉伸7 (cut)
    with BuildSketch(Plane.XZ):
        with BuildLine():
            ThreePointArc((-35, -84.5), (-34, -83.5), (-35, -82.5))
            Line((-35, -82.5), (-35, -84.5))
        make_face()
        with BuildLine():
            Line((-37, -84.5), (-37, -82.5))
            ThreePointArc((-37, -82.5), (-38, -83.5), (-37, -84.5))
        make_face()
        with Locations((-36, -83.5)):
            Rectangle(SKETCH_10_W, SKETCH_10_H)
        with Locations((-36, -90)):
            Rectangle(SKETCH_10_W, SKETCH_10_H_2)
        with Locations((-36, -96.5)):
            Rectangle(SKETCH_10_W, SKETCH_10_H)
        with BuildLine():
            Line((-37, -97.5), (-37, -95.5))
            ThreePointArc((-37, -95.5), (-38, -96.5), (-37, -97.5))
        make_face()
        with BuildLine():
            ThreePointArc((-35, -97.5), (-34, -96.5), (-35, -95.5))
            Line((-35, -95.5), (-35, -97.5))
        make_face()
        with Locations(Location((-31.5, -95, 0), (0, 0, 270))):
            Circle(SKETCH_10_R)
        with Locations(Location((-31.5, -85, 0), (0, 0, 270))):
            Circle(SKETCH_10_R)
        with BuildLine():
            ThreePointArc((107, -97.5), (108, -96.5), (107, -95.5))
            Line((107, -95.5), (107, -97.5))
        make_face()
        with Locations((106, -96.5)):
            Rectangle(SKETCH_10_W, SKETCH_10_H)
        with BuildLine():
            Line((105, -97.5), (105, -95.5))
            ThreePointArc((105, -95.5), (104, -96.5), (105, -97.5))
        make_face()
        with Locations((106, -90)):
            Rectangle(SKETCH_10_W, SKETCH_10_H_2)
        with BuildLine():
            ThreePointArc((107, -84.5), (108, -83.5), (107, -82.5))
            Line((107, -82.5), (107, -84.5))
        make_face()
        with Locations((106, -83.5)):
            Rectangle(SKETCH_10_W, SKETCH_10_H)
        with BuildLine():
            Line((105, -84.5), (105, -82.5))
            ThreePointArc((105, -82.5), (104, -83.5), (105, -84.5))
        make_face()
        with Locations(Location((101.5, -85, 0), (0, 0, 270))):
            Circle(SKETCH_10_R)
        with Locations(Location((101.5, -95, 0), (0, 0, 270))):
            Circle(SKETCH_10_R)
    extrude(amount=-CUT_EXTRUDE_7_DEPTH, mode=Mode.SUBTRACT)

    # 草图11 → 切除-拉伸8 (cut)
    with BuildSketch(Plane.XZ):
        with Locations(Location((35, -86.015496457, 0), (0, 0, 270))):
            Circle(SKETCH_11_R)
    extrude(amount=-CUT_EXTRUDE_8_DEPTH, mode=Mode.SUBTRACT)


with BuildPart() as cut_extrude_1_piece_2:
    # of the separate pieces the step leaves, piece 2, a body of its own (cut_extrude_1_pieces)
    add(part.part.solids().sort_by_distance((-40, 0, 77.5))[0])


with BuildPart() as cut_extrude_1_piece_3:
    # of the separate pieces the step leaves, piece 3, a body of its own (cut_extrude_1_pieces)
    add(part.part.solids().sort_by_distance((7.427610272, 0, 50.277176289))[0])


with BuildPart() as cut_extrude_1_piece_4:
    # of the separate pieces the step leaves, piece 4, a body of its own (cut_extrude_1_pieces)
    add(part.part.solids().sort_by_distance((113.89906921, 0, -47.607176289))[0])


with BuildPart() as cut_extrude_1_piece_5:
    # of the separate pieces the step leaves, piece 5, a body of its own (cut_extrude_1_pieces)
    add(part.part.solids().sort_by_distance((-43.89906921, 0, -47.937176289))[0])


with BuildPart() as cut_extrude_5_tool:
    # 草图8 → 切除-拉伸5 (new body)
    with BuildSketch(Plane(origin=(0, 0, 0), x_dir=(-1, 0, 0), z_dir=(0, -1, 0))):
        Polygon((78.212914253, 60.385355647), (0, 54.326624312), (-4.481912928, 51.672567956), (-7.938908088, 48.761414138), (-49.331876445, 46.578048774), (-63.52375131, 48.761414138), (-79.080229528, 55.85735157), (-126.563695568, 60.385355647), (-136.561762242, 25.020008622), (-185.509289936, -177.467896247), (-114.798778659, -331.741539621), (230.896230576, -266.427705394), (230.896230576, -108.933419225), (223.681342993, -70.746247105), align=None)
    extrude(amount=-CUT_EXTRUDE_5_DEPTH)


with BuildPart() as cut_extrude_1_piece_2_1:
    add(cut_extrude_1_piece_2.part)

    # 切除-拉伸5: cut by cut_extrude_5_tool
    add(cut_extrude_5_tool.part, mode=Mode.SUBTRACT)


with BuildPart() as cut_extrude_1_piece_3_1:
    add(cut_extrude_1_piece_3.part)

    # 切除-拉伸5: cut by cut_extrude_5_tool
    add(cut_extrude_5_tool.part, mode=Mode.SUBTRACT)


with BuildPart() as cut_extrude_1_piece_4_1:
    add(cut_extrude_1_piece_4.part)

    # 切除-拉伸5: cut by cut_extrude_5_tool
    add(cut_extrude_5_tool.part, mode=Mode.SUBTRACT)


with BuildPart() as cut_extrude_1_piece_5_1:
    add(cut_extrude_1_piece_5.part)

    # 切除-拉伸5: cut by cut_extrude_5_tool
    add(cut_extrude_5_tool.part, mode=Mode.SUBTRACT)


solid = cut_extrude_1_piece_1.part
